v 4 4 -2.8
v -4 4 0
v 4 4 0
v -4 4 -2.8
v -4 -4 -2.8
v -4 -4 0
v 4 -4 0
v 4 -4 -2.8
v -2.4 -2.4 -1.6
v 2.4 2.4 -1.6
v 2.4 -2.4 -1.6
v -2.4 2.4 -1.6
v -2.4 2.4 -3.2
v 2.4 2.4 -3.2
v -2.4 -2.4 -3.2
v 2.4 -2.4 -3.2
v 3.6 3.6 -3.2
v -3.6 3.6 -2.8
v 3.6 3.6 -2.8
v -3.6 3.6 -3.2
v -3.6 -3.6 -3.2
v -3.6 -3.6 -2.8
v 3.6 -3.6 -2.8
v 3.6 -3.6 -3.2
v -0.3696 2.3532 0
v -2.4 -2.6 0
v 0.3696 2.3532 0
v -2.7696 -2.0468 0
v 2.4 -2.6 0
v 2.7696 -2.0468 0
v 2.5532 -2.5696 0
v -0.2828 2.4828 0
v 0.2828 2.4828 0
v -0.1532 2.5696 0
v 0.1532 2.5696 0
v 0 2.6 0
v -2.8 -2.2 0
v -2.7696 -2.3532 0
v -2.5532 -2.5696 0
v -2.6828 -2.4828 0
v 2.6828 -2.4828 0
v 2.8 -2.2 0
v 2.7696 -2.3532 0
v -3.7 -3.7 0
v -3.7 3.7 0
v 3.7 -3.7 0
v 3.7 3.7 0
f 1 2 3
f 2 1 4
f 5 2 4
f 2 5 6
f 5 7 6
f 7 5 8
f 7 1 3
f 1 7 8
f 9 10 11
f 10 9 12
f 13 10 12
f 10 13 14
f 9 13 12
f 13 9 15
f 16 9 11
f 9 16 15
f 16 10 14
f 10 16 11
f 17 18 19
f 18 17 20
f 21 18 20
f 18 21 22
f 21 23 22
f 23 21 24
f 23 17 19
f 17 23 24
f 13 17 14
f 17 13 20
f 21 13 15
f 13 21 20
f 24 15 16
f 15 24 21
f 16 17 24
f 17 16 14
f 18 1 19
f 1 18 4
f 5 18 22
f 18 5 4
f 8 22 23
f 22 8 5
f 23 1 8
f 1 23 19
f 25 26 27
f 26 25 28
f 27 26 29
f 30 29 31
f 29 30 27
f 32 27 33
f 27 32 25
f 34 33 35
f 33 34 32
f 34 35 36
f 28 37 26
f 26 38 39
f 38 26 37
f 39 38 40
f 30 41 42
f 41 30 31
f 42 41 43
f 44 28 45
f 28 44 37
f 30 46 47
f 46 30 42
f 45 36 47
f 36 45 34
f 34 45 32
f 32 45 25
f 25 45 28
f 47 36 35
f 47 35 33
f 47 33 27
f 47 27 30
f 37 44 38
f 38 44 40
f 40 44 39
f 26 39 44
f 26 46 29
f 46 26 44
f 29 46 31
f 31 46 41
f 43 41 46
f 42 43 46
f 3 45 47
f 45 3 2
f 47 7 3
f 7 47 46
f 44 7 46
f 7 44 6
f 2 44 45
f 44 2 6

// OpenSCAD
// file: ../p/box5.scad
use <../lib.scad>
function ldraw_lib__box5() = [
// 0 Box with 5 Faces and All Edges
// 0 Name: box5.dat
// 0 Author: James Jessiman
// 0 !LDRAW_ORG Primitive UPDATE 2012-01
// 0 !LICENSE Licensed under CC BY 4.0 : see CAreadme.txt
// 
// 0 BFC CERTIFY CCW
  [0,"BFC","CERTIFY"],
  [0,"BFC","CCW"],
// 
// 0 !HISTORY 2002-04-03 [sbliss] Modified for BFC compliance
// 0 !HISTORY 2002-04-25 [PTadmin] Official Update 2002-02
// 0 !HISTORY 2007-06-24 [PTadmin] Header formatted for Contributor Agreement
// 0 !HISTORY 2008-07-01 [PTadmin] Official Update 2008-01
// 0 !HISTORY 2012-02-16 [Philo] Changed to CCW
// 0 !HISTORY 2012-03-30 [PTadmin] Official Update 2012-01
// 
// 
// 2 24 1 1 1 -1 1 1
  [2,24,1,1,1,-1,1,1],
// 2 24 -1 1 1 -1 1 -1
  [2,24,-1,1,1,-1,1,-1],
// 2 24 -1 1 -1 1 1 -1
  [2,24,-1,1,-1,1,1,-1],
// 2 24 1 1 -1 1 1 1
  [2,24,1,1,-1,1,1,1],
// 2 24 1 0 1 -1 0 1
  [2,24,1,0,1,-1,0,1],
// 2 24 -1 0 1 -1 0 -1
  [2,24,-1,0,1,-1,0,-1],
// 2 24 -1 0 -1 1 0 -1
  [2,24,-1,0,-1,1,0,-1],
// 2 24 1 0 -1 1 0 1
  [2,24,1,0,-1,1,0,1],
// 2 24 1 0 1 1 1 1
  [2,24,1,0,1,1,1,1],
// 2 24 -1 0 1 -1 1 1
  [2,24,-1,0,1,-1,1,1],
// 2 24 1 0 -1 1 1 -1
  [2,24,1,0,-1,1,1,-1],
// 2 24 -1 0 -1 -1 1 -1
  [2,24,-1,0,-1,-1,1,-1],
// 4 16 -1 1 1 1 1 1 1 1 -1 -1 1 -1
  [4,16,-1,1,1,1,1,1,1,1,-1,-1,1,-1],
// 4 16 -1 1 1 -1 0 1 1 0 1 1 1 1
  [4,16,-1,1,1,-1,0,1,1,0,1,1,1,1],
// 4 16 -1 1 -1 -1 0 -1 -1 0 1 -1 1 1
  [4,16,-1,1,-1,-1,0,-1,-1,0,1,-1,1,1],
// 4 16 1 1 -1 1 0 -1 -1 0 -1 -1 1 -1
  [4,16,1,1,-1,1,0,-1,-1,0,-1,-1,1,-1],
// 4 16 1 1 1 1 0 1 1 0 -1 1 1 -1
  [4,16,1,1,1,1,0,1,1,0,-1,1,1,-1],
];
module ldraw_lib__box5(step=0, col=false, unit=2/5, alt=false, line=0.2, solid=!$preview)
    makepoly(ldraw_lib__box5(), step=step, col=col, unit=unit, alt=alt, line=line, solid=solid);
ldraw_lib__box5(line=0.2);
// file: ../p/box4.scad
use <../lib.scad>
function ldraw_lib__box4() = [
// 0 Box with 4 Faces (2 Parallel Pairs) and All Edges
// 0 Name: box4.dat
// 0 Author: James Jessiman
// 0 !LDRAW_ORG Primitive UPDATE 2012-01
// 0 !LICENSE Licensed under CC BY 4.0 : see CAreadme.txt
// 
// 0 BFC CERTIFY CCW
  [0,"BFC","CERTIFY"],
  [0,"BFC","CCW"],
// 
// 0 !HISTORY 2002-04-03 [sbliss] Modified for BFC compliance
// 0 !HISTORY 2002-04-25 [PTadmin] Official Update 2002-02
// 0 !HISTORY 2007-06-24 [PTadmin] Header formatted for Contributor Agreement
// 0 !HISTORY 2008-07-01 [PTadmin] Official Update 2008-01
// 0 !HISTORY 2012-02-16 [Philo] Changed to CCW
// 0 !HISTORY 2012-03-30 [PTadmin] Official Update 2012-01
// 
// 
// 2 24 1 1 1 -1 1 1
  [2,24,1,1,1,-1,1,1],
// 2 24 -1 1 1 -1 1 -1
  [2,24,-1,1,1,-1,1,-1],
// 2 24 -1 1 -1 1 1 -1
  [2,24,-1,1,-1,1,1,-1],
// 2 24 1 1 -1 1 1 1
  [2,24,1,1,-1,1,1,1],
// 2 24 1 0 1 -1 0 1
  [2,24,1,0,1,-1,0,1],
// 2 24 -1 0 1 -1 0 -1
  [2,24,-1,0,1,-1,0,-1],
// 2 24 -1 0 -1 1 0 -1
  [2,24,-1,0,-1,1,0,-1],
// 2 24 1 0 -1 1 0 1
  [2,24,1,0,-1,1,0,1],
// 2 24 1 0 1 1 1 1
  [2,24,1,0,1,1,1,1],
// 2 24 -1 0 1 -1 1 1
  [2,24,-1,0,1,-1,1,1],
// 2 24 1 0 -1 1 1 -1
  [2,24,1,0,-1,1,1,-1],
// 2 24 -1 0 -1 -1 1 -1
  [2,24,-1,0,-1,-1,1,-1],
// 4 16 -1 1 1 -1 0 1 1 0 1 1 1 1
  [4,16,-1,1,1,-1,0,1,1,0,1,1,1,1],
// 4 16 -1 1 -1 -1 0 -1 -1 0 1 -1 1 1
  [4,16,-1,1,-1,-1,0,-1,-1,0,1,-1,1,1],
// 4 16 1 1 -1 1 0 -1 -1 0 -1 -1 1 -1
  [4,16,1,1,-1,1,0,-1,-1,0,-1,-1,1,-1],
// 4 16 1 1 1 1 0 1 1 0 -1 1 1 -1
  [4,16,1,1,1,1,0,1,1,0,-1,1,1,-1],
];
module ldraw_lib__box4(step=0, col=false, unit=2/5, alt=false, line=0.2, solid=!$preview)
    makepoly(ldraw_lib__box4(), step=step, col=col, unit=unit, alt=alt, line=line, solid=solid);
ldraw_lib__box4(line=0.2);
// file: s/3070bs01.scad
use <../../lib.scad>
use <../../p/box4.scad>
use <../../p/box5.scad>
function ldraw_lib__s__3070bs01() = [
// 0 ~Tile  1 x  1 with Groove without Top Face
// 0 Name: s\3070bs01.dat
// 0 Author: Chris Dee [cwdee]
// 0 !LDRAW_ORG Subpart UPDATE 2009-02
// 0 !LICENSE Licensed under CC BY 4.0 : see CAreadme.txt
// 
// 0 BFC CERTIFY CCW
  [0,"BFC","CERTIFY"],
  [0,"BFC","CCW"],
// 
// 0 !HISTORY 2009-09-03 [PTadmin] Official Update 2009-02
// 
// 
// 1 16 0 0 0 10 0 0 0 7 0 0 0 10 box4.dat
  [1,16,0,0,0,10,0,0,0,7,0,0,0,10, ldraw_lib__box4()],
// 0 BFC INVERTNEXT
  [0,"BFC","INVERTNEXT"],
// 1 16 0 8 0 6 0 0 0 -4 0 0 0 6 box5.dat
  [1,16,0,8,0,6,0,0,0,-4,0,0,0,6, ldraw_lib__box5()],
// 1 16 0 7 0 9 0 0 0 1 0 0 0 9 box4.dat
  [1,16,0,7,0,9,0,0,0,1,0,0,0,9, ldraw_lib__box4()],
// 
// 4 16 9 8 9 6 8 6 -6 8 6 -9 8 9
  [4,16,9,8,9,6,8,6,-6,8,6,-9,8,9],
// 4 16 -9 8 9 -6 8 6 -6 8 -6 -9 8 -9
  [4,16,-9,8,9,-6,8,6,-6,8,-6,-9,8,-9],
// 4 16 -9 8 -9 -6 8 -6 6 8 -6 9 8 -9
  [4,16,-9,8,-9,-6,8,-6,6,8,-6,9,8,-9],
// 4 16 9 8 -9 6 8 -6 6 8 6 9 8 9
  [4,16,9,8,-9,6,8,-6,6,8,6,9,8,9],
// 
// 4 16 10 7 10 9 7 9 -9 7 9 -10 7 10
  [4,16,10,7,10,9,7,9,-9,7,9,-10,7,10],
// 4 16 -10 7 10 -9 7 9 -9 7 -9 -10 7 -10
  [4,16,-10,7,10,-9,7,9,-9,7,-9,-10,7,-10],
// 4 16 -10 7 -10 -9 7 -9 9 7 -9 10 7 -10
  [4,16,-10,7,-10,-9,7,-9,9,7,-9,10,7,-10],
// 4 16 10 7 -10 9 7 -9 9 7 9 10 7 10
  [4,16,10,7,-10,9,7,-9,9,7,9,10,7,10],
// 0
];
module ldraw_lib__s__3070bs01(step=0, col=false, unit=2/5, alt=false, line=0.2, solid=!$preview)
    makepoly(ldraw_lib__s__3070bs01(), step=step, col=col, unit=unit, alt=alt, line=line, solid=solid);
ldraw_lib__s__3070bs01(line=0.2);
// main file
use <../lib.scad>
use <s/3070bs01.scad>
function ldraw_lib__3070bp0k() = [
// 0 Tile  1 x  1 with Yellow Rounded Corners Triangle Frame Pattern
// 0 Name: 3070bp0k.dat
// 0 Author: Vincent Messenet [Cheenzo]
// 0 !LDRAW_ORG Part UPDATE 2019-02
// 0 !LICENSE Licensed under CC BY 4.0 : see CAreadme.txt
// 
// 0 BFC CERTIFY CCW
  [0,"BFC","CERTIFY"],
  [0,"BFC","CCW"],
// 
// 0 !KEYWORDS BrickLink 3070pb130, Rebrickable 3070bpr0191, Set 70829
// 
// 0 !HISTORY 2019-09-09 [PTadmin] Official Update 2019-02
// 
// 
// 1 16 0 0 0 1 0 0 0 1 0 0 0 1 s\3070bs01.dat
  [1,16,0,0,0,1,0,0,0,1,0,0,0,1, ldraw_lib__s__3070bs01()],
// 
// 4 16 -.924 0 5.883 -6.924 0 -5.117 -6 0 -6.5 .924 0 5.883
  [4,16,-.924,0,5.883,-6.924,0,-5.117,-6,0,-6.5,.924,0,5.883],
// 3 16 .924 0 5.883 -6 0 -6.5 6 0 -6.5
  [3,16,.924,0,5.883,-6,0,-6.5,6,0,-6.5],
// 4 16 6.383 0 -6.424 6.924 0 -5.117 .924 0 5.883 6 0 -6.5
  [4,16,6.383,0,-6.424,6.924,0,-5.117,.924,0,5.883,6,0,-6.5],
// 4 16 -.924 0 5.883 .924 0 5.883 .707 0 6.207 -.707 0 6.207
  [4,16,-.924,0,5.883,.924,0,5.883,.707,0,6.207,-.707,0,6.207],
// 4 16 -.707 0 6.207 .707 0 6.207 .383 0 6.424 -.383 0 6.424
  [4,16,-.707,0,6.207,.707,0,6.207,.383,0,6.424,-.383,0,6.424],
// 3 16 -.383 0 6.424 .383 0 6.424 0 0 6.5
  [3,16,-.383,0,6.424,.383,0,6.424,0,0,6.5],
// 3 16 -6.924 0 -5.117 -7 0 -5.5 -6 0 -6.5
  [3,16,-6.924,0,-5.117,-7,0,-5.5,-6,0,-6.5],
// 4 16 -6 0 -6.5 -7 0 -5.5 -6.924 0 -5.883 -6.383 0 -6.424
  [4,16,-6,0,-6.5,-7,0,-5.5,-6.924,0,-5.883,-6.383,0,-6.424],
// 3 16 -6.383 0 -6.424 -6.924 0 -5.883 -6.707 0 -6.207
  [3,16,-6.383,0,-6.424,-6.924,0,-5.883,-6.707,0,-6.207],
// 4 16 6.924 0 -5.117 6.383 0 -6.424 6.707 0 -6.207 7 0 -5.5
  [4,16,6.924,0,-5.117,6.383,0,-6.424,6.707,0,-6.207,7,0,-5.5],
// 3 16 7 0 -5.5 6.707 0 -6.207 6.924 0 -5.883
  [3,16,7,0,-5.5,6.707,0,-6.207,6.924,0,-5.883],
// 
// 4 14 -6.924 0 -5.117 -9.25 0 9.25 -9.25 0 -9.25 -7 0 -5.5
  [4,14,-6.924,0,-5.117,-9.25,0,9.25,-9.25,0,-9.25,-7,0,-5.5],
// 4 14 6.924 0 -5.117 7 0 -5.5 9.25 0 -9.25 9.25 0 9.25
  [4,14,6.924,0,-5.117,7,0,-5.5,9.25,0,-9.25,9.25,0,9.25],
// 4 14 -.383 0 6.424 0 0 6.5 9.25 0 9.25 -9.25 0 9.25
  [4,14,-.383,0,6.424,0,0,6.5,9.25,0,9.25,-9.25,0,9.25],
// 3 14 -.383 0 6.424 -9.25 0 9.25 -.707 0 6.207
  [3,14,-.383,0,6.424,-9.25,0,9.25,-.707,0,6.207],
// 3 14 -.707 0 6.207 -9.25 0 9.25 -.924 0 5.883
  [3,14,-.707,0,6.207,-9.25,0,9.25,-.924,0,5.883],
// 3 14 -.924 0 5.883 -9.25 0 9.25 -6.924 0 -5.117
  [3,14,-.924,0,5.883,-9.25,0,9.25,-6.924,0,-5.117],
// 3 14 9.25 0 9.25 0 0 6.5 .383 0 6.424
  [3,14,9.25,0,9.25,0,0,6.5,.383,0,6.424],
// 3 14 9.25 0 9.25 .383 0 6.424 .707 0 6.207
  [3,14,9.25,0,9.25,.383,0,6.424,.707,0,6.207],
// 3 14 9.25 0 9.25 .707 0 6.207 .924 0 5.883
  [3,14,9.25,0,9.25,.707,0,6.207,.924,0,5.883],
// 3 14 9.25 0 9.25 .924 0 5.883 6.924 0 -5.117
  [3,14,9.25,0,9.25,.924,0,5.883,6.924,0,-5.117],
// 3 14 -7 0 -5.5 -9.25 0 -9.25 -6.924 0 -5.883
  [3,14,-7,0,-5.5,-9.25,0,-9.25,-6.924,0,-5.883],
// 3 14 -6.924 0 -5.883 -9.25 0 -9.25 -6.707 0 -6.207
  [3,14,-6.924,0,-5.883,-9.25,0,-9.25,-6.707,0,-6.207],
// 3 14 -6.707 0 -6.207 -9.25 0 -9.25 -6.383 0 -6.424
  [3,14,-6.707,0,-6.207,-9.25,0,-9.25,-6.383,0,-6.424],
// 3 14 -6 0 -6.5 -6.383 0 -6.424 -9.25 0 -9.25
  [3,14,-6,0,-6.5,-6.383,0,-6.424,-9.25,0,-9.25],
// 4 14 9.25 0 -9.25 6 0 -6.5 -6 0 -6.5 -9.25 0 -9.25
  [4,14,9.25,0,-9.25,6,0,-6.5,-6,0,-6.5,-9.25,0,-9.25],
// 3 14 6 0 -6.5 9.25 0 -9.25 6.383 0 -6.424
  [3,14,6,0,-6.5,9.25,0,-9.25,6.383,0,-6.424],
// 3 14 6.383 0 -6.424 9.25 0 -9.25 6.707 0 -6.207
  [3,14,6.383,0,-6.424,9.25,0,-9.25,6.707,0,-6.207],
// 3 14 6.924 0 -5.883 6.707 0 -6.207 9.25 0 -9.25
  [3,14,6.924,0,-5.883,6.707,0,-6.207,9.25,0,-9.25],
// 3 14 7 0 -5.5 6.924 0 -5.883 9.25 0 -9.25
  [3,14,7,0,-5.5,6.924,0,-5.883,9.25,0,-9.25],
// 
// 4 16 10 0 10 -10 0 10 -9.25 0 9.25 9.25 0 9.25
  [4,16,10,0,10,-10,0,10,-9.25,0,9.25,9.25,0,9.25],
// 4 16 9.25 0 -9.25 10 0 -10 10 0 10 9.25 0 9.25
  [4,16,9.25,0,-9.25,10,0,-10,10,0,10,9.25,0,9.25],
// 4 16 10 0 -10 9.25 0 -9.25 -9.25 0 -9.25 -10 0 -10
  [4,16,10,0,-10,9.25,0,-9.25,-9.25,0,-9.25,-10,0,-10],
// 4 16 -9.25 0 9.25 -10 0 10 -10 0 -10 -9.25 0 -9.25
  [4,16,-9.25,0,9.25,-10,0,10,-10,0,-10,-9.25,0,-9.25],
];
module ldraw_lib__3070bp0k(step=0, col=false, unit=2/5, alt=false, line=0.2, solid=!$preview)
    makepoly(ldraw_lib__3070bp0k(), step=step, col=col, unit=unit, alt=alt, line=line, solid=solid);
ldraw_lib__3070bp0k(line=0.2);
